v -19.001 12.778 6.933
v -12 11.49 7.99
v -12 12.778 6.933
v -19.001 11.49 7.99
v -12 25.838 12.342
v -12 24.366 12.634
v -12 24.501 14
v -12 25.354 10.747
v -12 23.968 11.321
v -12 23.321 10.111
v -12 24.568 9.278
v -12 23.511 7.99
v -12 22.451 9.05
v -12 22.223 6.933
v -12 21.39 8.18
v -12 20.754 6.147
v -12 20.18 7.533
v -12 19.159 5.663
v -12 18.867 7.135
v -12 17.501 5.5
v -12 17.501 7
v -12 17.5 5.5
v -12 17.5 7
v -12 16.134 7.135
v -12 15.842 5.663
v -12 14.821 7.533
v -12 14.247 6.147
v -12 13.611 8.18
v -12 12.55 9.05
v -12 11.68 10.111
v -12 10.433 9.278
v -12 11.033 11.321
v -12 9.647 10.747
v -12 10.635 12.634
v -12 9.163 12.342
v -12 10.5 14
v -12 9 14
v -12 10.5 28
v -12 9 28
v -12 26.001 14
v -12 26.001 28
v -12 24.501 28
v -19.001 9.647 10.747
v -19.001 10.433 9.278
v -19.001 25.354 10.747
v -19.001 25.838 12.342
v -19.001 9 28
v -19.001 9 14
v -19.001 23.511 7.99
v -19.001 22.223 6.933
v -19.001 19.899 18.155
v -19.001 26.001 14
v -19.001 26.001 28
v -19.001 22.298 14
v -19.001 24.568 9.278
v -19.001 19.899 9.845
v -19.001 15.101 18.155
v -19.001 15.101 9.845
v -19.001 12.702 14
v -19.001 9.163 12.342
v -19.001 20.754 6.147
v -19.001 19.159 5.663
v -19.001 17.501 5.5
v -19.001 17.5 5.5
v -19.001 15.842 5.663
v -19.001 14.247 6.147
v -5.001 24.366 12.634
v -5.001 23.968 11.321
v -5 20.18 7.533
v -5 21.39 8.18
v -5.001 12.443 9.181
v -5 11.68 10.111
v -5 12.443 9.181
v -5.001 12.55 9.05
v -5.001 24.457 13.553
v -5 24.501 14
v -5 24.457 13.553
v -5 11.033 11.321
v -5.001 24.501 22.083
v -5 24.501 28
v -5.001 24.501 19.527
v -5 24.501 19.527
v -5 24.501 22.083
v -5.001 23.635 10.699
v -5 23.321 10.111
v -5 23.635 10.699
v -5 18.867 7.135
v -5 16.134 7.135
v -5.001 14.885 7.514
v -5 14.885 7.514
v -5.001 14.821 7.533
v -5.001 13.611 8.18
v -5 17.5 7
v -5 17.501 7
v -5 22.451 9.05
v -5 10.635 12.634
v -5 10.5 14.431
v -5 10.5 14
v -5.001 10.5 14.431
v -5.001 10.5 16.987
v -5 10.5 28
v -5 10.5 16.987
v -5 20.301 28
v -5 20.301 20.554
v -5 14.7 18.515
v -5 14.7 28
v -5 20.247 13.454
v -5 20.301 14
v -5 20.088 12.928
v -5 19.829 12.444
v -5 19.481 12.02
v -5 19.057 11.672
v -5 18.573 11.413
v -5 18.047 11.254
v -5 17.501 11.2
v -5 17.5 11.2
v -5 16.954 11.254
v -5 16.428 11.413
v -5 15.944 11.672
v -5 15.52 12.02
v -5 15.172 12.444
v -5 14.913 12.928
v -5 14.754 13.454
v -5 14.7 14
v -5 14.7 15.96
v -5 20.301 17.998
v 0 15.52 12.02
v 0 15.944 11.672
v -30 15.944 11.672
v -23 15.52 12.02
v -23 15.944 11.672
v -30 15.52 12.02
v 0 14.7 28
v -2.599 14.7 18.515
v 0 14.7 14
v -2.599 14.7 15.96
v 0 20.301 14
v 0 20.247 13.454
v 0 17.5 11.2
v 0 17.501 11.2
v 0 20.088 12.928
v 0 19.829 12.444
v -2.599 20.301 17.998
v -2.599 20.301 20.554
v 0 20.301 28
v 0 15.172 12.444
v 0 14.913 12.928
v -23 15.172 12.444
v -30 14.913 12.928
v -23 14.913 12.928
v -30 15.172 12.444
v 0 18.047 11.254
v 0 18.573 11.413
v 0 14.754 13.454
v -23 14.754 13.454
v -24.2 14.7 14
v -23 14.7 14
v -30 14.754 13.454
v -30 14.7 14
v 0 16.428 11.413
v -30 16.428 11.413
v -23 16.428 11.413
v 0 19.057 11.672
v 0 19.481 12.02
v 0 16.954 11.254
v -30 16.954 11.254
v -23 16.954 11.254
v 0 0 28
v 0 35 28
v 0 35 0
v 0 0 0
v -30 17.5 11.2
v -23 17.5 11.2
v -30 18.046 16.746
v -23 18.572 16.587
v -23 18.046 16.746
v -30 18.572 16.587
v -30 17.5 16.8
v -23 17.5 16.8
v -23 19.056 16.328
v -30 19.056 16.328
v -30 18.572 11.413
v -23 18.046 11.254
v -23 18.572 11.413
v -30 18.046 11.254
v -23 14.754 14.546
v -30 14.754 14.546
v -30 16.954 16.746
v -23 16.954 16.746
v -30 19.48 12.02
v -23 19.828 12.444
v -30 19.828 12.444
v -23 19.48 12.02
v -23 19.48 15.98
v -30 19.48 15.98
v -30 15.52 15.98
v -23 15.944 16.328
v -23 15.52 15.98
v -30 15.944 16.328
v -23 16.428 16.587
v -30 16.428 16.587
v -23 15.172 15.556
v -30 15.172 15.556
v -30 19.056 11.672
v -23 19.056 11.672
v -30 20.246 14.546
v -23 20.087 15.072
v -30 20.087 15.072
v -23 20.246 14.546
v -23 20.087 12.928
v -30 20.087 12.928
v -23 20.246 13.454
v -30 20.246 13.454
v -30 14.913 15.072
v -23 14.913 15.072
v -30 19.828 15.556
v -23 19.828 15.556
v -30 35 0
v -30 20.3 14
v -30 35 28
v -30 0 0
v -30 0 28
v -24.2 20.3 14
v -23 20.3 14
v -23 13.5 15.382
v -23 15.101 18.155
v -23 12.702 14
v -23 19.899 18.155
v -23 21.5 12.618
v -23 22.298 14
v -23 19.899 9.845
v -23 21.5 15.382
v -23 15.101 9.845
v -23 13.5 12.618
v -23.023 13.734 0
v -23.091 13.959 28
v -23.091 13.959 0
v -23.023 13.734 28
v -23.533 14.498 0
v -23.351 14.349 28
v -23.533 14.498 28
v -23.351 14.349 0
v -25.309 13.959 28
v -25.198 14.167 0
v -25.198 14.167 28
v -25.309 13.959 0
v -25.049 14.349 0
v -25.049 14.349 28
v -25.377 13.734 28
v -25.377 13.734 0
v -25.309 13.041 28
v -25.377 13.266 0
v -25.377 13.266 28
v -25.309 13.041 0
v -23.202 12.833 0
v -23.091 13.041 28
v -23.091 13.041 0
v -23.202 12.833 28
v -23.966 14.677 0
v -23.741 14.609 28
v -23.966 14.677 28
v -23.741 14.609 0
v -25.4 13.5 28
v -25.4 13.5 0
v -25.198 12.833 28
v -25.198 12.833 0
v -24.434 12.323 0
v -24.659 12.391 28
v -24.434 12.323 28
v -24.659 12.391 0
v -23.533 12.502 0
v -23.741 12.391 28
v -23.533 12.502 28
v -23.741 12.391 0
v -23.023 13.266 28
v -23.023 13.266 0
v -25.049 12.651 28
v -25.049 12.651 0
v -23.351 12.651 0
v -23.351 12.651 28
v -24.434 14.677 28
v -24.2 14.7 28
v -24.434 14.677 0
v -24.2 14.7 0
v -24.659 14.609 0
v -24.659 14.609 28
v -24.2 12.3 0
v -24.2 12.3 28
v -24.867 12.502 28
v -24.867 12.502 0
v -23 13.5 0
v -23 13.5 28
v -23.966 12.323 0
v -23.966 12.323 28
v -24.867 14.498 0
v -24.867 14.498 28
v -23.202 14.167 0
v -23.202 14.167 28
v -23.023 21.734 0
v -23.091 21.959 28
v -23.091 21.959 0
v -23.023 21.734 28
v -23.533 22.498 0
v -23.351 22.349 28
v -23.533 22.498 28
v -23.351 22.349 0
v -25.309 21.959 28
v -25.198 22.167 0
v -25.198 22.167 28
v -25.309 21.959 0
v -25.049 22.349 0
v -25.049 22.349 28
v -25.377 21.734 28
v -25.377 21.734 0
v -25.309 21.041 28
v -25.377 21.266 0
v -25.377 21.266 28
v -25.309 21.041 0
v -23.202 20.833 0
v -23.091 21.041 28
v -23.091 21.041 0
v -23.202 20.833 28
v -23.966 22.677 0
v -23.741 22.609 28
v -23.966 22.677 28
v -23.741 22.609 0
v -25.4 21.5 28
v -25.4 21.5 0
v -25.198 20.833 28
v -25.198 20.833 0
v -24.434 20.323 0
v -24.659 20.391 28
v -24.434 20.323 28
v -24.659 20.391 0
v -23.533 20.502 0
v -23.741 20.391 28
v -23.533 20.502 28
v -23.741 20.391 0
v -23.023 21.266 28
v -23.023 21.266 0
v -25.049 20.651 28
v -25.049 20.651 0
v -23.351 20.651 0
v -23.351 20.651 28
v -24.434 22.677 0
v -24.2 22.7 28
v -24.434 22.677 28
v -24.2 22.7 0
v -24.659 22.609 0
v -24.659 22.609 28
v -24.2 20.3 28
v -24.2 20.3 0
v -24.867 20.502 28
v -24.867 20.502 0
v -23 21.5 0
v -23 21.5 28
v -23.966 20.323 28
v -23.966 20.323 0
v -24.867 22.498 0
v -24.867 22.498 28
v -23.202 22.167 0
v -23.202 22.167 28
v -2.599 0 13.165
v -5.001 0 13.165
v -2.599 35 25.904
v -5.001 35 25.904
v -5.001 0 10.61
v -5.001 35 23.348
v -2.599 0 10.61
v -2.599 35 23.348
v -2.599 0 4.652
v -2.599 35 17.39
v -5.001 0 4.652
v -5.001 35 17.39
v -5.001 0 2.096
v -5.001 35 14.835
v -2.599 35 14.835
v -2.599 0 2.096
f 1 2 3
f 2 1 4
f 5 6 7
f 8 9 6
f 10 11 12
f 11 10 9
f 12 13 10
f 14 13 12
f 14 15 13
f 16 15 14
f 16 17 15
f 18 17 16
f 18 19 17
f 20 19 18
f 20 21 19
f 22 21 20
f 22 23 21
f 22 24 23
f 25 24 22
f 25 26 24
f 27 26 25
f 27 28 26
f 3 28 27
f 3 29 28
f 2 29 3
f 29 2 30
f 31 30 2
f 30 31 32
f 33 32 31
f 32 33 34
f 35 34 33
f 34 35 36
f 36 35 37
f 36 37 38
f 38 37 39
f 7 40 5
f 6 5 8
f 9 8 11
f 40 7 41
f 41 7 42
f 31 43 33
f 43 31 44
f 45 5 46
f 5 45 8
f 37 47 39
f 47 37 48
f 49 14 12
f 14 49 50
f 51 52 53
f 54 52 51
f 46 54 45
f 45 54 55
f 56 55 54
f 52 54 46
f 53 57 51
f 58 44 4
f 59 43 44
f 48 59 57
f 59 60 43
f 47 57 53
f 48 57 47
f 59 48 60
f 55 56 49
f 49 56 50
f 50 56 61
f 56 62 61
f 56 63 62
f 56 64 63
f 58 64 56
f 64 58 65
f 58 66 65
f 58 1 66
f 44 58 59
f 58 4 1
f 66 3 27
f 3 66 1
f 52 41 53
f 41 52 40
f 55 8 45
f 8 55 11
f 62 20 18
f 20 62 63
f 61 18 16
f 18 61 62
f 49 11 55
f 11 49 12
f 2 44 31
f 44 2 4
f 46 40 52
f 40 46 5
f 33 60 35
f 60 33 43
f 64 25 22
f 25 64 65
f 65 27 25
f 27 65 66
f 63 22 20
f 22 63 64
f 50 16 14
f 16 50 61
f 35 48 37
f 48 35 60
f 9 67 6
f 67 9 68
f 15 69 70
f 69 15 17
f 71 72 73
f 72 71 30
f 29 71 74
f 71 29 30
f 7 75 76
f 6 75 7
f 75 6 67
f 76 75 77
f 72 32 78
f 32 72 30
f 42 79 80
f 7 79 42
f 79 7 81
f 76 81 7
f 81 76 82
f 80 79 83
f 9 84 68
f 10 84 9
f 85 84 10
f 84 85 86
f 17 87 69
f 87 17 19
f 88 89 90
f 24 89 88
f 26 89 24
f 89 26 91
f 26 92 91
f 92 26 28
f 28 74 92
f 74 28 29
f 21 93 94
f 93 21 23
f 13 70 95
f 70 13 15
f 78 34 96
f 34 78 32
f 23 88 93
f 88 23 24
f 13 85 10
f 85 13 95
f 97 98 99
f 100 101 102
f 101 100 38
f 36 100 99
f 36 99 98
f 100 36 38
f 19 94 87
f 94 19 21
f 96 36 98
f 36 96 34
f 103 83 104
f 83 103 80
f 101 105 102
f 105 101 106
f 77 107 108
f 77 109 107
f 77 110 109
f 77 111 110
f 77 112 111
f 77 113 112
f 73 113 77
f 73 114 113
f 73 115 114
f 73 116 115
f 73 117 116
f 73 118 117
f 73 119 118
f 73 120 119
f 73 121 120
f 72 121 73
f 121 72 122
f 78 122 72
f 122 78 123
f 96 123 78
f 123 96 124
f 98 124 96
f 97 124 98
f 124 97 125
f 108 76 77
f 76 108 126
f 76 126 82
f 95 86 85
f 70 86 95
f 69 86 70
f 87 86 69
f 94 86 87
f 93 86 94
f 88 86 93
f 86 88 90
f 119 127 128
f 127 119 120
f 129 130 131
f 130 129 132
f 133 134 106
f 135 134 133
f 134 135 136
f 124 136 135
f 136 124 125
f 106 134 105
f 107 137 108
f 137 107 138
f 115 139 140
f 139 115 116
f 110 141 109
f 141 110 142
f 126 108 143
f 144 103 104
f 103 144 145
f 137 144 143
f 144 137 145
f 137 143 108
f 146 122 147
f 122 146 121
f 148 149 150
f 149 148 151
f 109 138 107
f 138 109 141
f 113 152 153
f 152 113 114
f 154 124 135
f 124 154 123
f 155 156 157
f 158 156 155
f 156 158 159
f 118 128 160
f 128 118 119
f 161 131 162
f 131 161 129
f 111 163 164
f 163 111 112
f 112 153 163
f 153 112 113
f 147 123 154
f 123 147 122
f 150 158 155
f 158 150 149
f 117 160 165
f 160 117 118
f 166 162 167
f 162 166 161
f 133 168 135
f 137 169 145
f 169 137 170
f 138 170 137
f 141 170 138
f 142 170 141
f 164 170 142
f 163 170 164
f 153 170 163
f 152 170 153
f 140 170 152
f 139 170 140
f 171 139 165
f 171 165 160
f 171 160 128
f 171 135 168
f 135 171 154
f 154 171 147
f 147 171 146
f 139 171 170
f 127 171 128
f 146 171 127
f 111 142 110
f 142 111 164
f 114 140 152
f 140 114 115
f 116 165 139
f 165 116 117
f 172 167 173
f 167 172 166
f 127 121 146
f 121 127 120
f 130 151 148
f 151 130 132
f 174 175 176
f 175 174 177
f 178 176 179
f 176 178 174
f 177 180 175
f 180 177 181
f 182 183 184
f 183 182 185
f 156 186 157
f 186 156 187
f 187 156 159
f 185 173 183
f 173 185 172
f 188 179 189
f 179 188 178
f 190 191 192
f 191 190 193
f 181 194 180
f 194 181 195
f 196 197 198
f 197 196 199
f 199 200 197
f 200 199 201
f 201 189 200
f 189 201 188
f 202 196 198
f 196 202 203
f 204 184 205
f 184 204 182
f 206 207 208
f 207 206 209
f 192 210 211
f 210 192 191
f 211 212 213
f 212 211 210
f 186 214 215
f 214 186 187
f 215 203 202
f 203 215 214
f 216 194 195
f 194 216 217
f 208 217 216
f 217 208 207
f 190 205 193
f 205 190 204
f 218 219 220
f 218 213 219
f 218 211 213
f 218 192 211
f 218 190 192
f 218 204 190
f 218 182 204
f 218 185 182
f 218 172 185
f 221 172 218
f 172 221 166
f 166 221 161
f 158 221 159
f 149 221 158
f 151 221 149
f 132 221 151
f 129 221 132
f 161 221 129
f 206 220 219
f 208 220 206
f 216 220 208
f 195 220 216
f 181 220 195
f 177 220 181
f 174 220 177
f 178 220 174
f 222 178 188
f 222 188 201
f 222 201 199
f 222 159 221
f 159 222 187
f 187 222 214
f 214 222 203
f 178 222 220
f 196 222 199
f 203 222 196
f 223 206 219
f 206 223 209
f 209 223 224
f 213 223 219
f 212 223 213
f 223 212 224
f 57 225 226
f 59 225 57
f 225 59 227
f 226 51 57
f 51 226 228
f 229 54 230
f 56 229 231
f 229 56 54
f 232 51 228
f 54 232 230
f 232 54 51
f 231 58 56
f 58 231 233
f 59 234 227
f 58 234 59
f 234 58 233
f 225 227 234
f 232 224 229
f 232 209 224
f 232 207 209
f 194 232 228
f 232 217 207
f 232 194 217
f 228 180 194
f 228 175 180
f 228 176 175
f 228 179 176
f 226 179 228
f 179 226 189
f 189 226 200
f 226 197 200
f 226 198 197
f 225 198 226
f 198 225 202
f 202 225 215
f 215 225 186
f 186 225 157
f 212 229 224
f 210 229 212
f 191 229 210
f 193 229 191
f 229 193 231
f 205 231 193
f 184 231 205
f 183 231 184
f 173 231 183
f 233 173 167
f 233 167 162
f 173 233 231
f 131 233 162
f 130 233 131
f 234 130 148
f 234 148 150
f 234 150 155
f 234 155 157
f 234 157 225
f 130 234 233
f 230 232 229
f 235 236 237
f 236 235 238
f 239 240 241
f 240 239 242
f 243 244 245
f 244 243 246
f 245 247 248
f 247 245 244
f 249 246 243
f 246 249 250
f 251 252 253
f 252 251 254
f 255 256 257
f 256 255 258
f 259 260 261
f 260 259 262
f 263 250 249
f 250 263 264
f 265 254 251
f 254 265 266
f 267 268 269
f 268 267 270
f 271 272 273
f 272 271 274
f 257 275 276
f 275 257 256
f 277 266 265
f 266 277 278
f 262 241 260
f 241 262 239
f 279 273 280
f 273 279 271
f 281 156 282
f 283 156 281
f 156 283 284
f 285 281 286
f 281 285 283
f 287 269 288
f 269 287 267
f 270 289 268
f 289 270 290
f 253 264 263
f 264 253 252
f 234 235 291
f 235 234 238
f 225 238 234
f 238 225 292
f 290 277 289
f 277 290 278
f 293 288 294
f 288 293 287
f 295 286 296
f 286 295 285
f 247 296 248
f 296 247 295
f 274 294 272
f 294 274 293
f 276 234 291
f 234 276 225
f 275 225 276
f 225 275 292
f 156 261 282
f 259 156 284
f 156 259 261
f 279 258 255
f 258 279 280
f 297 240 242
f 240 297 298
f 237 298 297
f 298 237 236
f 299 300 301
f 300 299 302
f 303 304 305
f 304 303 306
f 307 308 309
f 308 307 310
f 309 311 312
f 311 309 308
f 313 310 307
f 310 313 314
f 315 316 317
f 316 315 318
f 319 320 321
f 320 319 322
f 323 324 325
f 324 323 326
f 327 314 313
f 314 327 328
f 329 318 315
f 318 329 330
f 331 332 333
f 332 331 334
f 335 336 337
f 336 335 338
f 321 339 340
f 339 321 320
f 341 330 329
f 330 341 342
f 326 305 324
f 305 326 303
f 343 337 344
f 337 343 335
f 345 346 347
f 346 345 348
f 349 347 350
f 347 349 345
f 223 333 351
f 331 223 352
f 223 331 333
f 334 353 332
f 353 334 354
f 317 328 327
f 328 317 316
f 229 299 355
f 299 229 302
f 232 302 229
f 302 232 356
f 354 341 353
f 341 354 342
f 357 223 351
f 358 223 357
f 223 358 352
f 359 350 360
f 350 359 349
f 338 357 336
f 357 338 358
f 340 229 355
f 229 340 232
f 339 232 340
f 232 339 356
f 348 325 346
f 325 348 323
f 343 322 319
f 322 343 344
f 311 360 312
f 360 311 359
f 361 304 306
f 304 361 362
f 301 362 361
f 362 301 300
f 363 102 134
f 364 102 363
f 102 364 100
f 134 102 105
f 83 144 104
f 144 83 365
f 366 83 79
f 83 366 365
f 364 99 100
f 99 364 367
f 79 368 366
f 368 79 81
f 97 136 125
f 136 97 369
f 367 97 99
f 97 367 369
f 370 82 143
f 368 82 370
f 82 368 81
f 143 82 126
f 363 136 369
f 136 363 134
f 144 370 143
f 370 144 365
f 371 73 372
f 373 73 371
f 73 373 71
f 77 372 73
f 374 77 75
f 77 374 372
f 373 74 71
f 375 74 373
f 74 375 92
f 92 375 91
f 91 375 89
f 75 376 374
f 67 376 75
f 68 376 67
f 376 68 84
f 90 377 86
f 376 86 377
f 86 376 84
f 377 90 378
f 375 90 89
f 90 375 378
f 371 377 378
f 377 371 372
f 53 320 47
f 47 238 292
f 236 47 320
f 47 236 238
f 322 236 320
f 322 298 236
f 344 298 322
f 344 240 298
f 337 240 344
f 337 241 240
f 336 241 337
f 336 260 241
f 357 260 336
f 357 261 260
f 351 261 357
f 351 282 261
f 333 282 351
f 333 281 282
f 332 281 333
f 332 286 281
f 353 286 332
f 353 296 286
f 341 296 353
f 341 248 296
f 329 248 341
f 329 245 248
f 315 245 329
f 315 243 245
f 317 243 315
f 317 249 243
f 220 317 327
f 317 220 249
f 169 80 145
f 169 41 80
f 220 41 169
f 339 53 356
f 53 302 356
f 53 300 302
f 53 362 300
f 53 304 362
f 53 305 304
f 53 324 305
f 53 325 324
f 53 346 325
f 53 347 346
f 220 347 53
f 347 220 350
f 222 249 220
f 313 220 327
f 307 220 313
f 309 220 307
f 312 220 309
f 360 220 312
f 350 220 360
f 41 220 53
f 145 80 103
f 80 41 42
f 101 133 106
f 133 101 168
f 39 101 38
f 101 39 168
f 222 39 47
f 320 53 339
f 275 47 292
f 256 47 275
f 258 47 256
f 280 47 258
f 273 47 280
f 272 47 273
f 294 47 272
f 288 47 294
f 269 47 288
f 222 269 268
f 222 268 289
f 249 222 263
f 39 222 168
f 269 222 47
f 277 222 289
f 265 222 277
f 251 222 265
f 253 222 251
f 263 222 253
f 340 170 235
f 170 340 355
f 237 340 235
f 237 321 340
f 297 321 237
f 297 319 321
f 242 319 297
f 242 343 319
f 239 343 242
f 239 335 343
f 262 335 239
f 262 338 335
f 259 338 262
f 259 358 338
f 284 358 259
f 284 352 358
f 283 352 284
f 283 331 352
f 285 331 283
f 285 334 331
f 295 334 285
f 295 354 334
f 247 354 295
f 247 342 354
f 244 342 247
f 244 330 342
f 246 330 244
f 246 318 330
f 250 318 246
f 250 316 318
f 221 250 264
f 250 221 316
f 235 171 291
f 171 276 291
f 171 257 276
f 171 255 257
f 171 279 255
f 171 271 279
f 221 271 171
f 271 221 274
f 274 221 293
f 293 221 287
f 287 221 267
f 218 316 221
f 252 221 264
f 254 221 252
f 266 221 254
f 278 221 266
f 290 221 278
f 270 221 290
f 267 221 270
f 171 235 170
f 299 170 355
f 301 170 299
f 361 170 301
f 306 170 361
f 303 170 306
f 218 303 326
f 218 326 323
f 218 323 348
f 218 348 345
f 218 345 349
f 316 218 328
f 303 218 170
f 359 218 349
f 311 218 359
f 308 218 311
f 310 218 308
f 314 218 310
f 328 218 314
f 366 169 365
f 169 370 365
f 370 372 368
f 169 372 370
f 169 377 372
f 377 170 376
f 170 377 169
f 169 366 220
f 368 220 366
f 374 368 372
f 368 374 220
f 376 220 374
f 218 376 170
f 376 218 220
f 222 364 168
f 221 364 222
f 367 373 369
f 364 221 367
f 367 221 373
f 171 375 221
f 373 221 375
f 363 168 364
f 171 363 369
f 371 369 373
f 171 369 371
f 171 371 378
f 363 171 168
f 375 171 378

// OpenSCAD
// [FL_INDEX: keywords="openscad, 3d_parametric, Customizable_Gear_Puller_that_actually_works, csg_solid" | COT="Parametric OpenSCAD design from 3DCodeverse"]
// Title: Customizable Gear Puller that actually works!!!

// Created by Jakub Husak, Poland, 27.07.2013
// Licence: Attribution - Non-Commercial - Share Alike
// Script to create a customizable gear puller. It could be important that
// the gear fits tightly and the lower part is as thick as the gap between
// motor and gear.

// Thick of bottom collar
hbottom=5; // [3:10

// Height of the lower part of the gear
hgear=7;

// Radius of the lower part of the gear
rgear=7; // [4:20]

// Height of the upper part of the gear
hgeart=7; // [0:20]

// Radius of the uppper part of the gear
rgeart=8.5; // [4:20]

// Thick of the top (must be more thick as the pins and nut together plus 2 mm)
htop=11; // [5:20]

// Radius of the motor shaft
rshaft=2.8; 

// Radius of the pins
rrivet=1.2;

// Thick of the nut
hnut=4; // [3:6]

// Nut size 
snut=8; // [6:13]

/* */
oheight=hbottom+hgear+hgeart+htop;
$fn=32;


rotate([0,-90,0])
difference()
{
cube([4*rgear,5*rgear,oheight]);
translate([2*rgear,2.5*rgear,0])
dig();
}

module dig()
{
niche();
shaft();
translate([0,0,hbottom+hgear+hgeart+hnut])
rivetholes(1,32,1);
rotate([0,0,70])
translate([0,0,hbottom])
rivetholes(-1,4,1.415);
}

module niche()
{
minkowski(){
hole();
cube([2*rgear,0.001,0.001]);
}

}
module hole()
{
cylinder(h=hbottom, r=rshaft);
translate([0,0,hbottom])
cylinder(h=hgear, r=rgear);
translate([0,0,hbottom+hgear])
cylinder(h=hgeart, r=rgeart);
}

module shaft()
{
cylinder(h=oheight, r=rshaft);
translate([0,0,hbottom+hgear+hgeart])
rotate([0,0,30])
cylinder(h=hnut, r=snut/2/0.87+0.2, $fn=6);

}

module rivetholes(off,c,d)
{
$fn=c;
for (i=[-1,1])
rotate([90,0,90])
translate([i*(rshaft+rrivet),off*rrivet,0])
rotate([0,0,45])
cylinder(r=rrivet*d,h=100,center=true);


}
